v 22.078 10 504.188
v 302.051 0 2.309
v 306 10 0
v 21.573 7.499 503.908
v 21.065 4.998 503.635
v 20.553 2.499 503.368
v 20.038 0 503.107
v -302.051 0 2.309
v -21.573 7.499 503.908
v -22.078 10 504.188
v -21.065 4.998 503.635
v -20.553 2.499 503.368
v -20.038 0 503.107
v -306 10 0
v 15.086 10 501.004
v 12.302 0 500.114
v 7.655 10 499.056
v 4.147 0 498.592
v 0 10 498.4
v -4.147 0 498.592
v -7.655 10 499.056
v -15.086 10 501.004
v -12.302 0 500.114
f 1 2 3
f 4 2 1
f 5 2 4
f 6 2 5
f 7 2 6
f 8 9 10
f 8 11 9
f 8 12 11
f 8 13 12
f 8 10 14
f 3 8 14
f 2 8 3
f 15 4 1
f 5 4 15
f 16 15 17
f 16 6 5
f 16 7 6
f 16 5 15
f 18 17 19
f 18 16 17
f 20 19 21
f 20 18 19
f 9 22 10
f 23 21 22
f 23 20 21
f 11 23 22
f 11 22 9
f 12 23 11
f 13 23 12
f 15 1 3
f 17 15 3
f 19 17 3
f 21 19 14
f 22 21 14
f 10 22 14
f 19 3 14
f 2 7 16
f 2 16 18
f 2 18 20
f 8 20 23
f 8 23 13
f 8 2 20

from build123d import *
from OCP.BRepFilletAPI import BRepFilletAPI_MakeChamfer

# Parameters (mm, degrees)
BOSS_EXTRUDE1_DEPTH = 10
CHAMFER1_SIZE       = 10
CHAMFER1_SIZE_2     = 2.308681911


with BuildPart() as part:
    # Sketch1 → Boss-Extrude1 (new body)
    with BuildSketch(Plane(origin=(0, 0, 0), x_dir=(1, 0, 0), z_dir=(0, 1, 0))):
        with BuildLine():
            Line((-306, 0), (306, 0))
            Line((306, 0), (22.078307516, -504.188415778))
            ThreePointArc((22.078307516, -504.188415778), (0, -498.4), (-22.078307516, -504.188415778))
            Line((-22.078307516, -504.188415778), (-306, 0))
        make_face()
    extrude(amount=BOSS_EXTRUDE1_DEPTH)

    # Chamfer1
    chamfer1_edges_1 = [part.edges().sort_by_distance(p)[0] for p in [
        (-164.039153758, 0, 252.094207889),
    ]]
    chamfer1_side_1 = [part.faces().sort_by_distance(p)[0] for p in [
        (-164.039153758, 0.046173638, 252.094207889),
    ]]
    chamfer1_edges_2 = [part.edges().sort_by_distance(p)[0] for p in [
        (0, 0, 0),
    ]]
    chamfer1_side_2 = [part.faces().sort_by_distance(p)[0] for p in [
        (0, 0.046173638, 0),
    ]]
    chamfer1_edges_3 = [part.edges().sort_by_distance(p)[0] for p in [
        (164.039153758, 0, 252.094207889),
    ]]
    chamfer1_side_3 = [part.faces().sort_by_distance(p)[0] for p in [
        (164.039153758, 0.046173638, 252.094207889),
    ]]
    chamfer1 = BRepFilletAPI_MakeChamfer(part.part.solid().wrapped)
    for e in chamfer1_edges_1:
        chamfer1.Add(CHAMFER1_SIZE - 0.0001, CHAMFER1_SIZE_2 - 0.0001, e.wrapped, chamfer1_side_1[0].wrapped)
    for e in chamfer1_edges_2:
        chamfer1.Add(CHAMFER1_SIZE - 0.0001, CHAMFER1_SIZE_2 - 0.0001, e.wrapped, chamfer1_side_2[0].wrapped)
    for e in chamfer1_edges_3:
        chamfer1.Add(CHAMFER1_SIZE - 0.0001, CHAMFER1_SIZE_2 - 0.0001, e.wrapped, chamfer1_side_3[0].wrapped)
    add(Compound.cast(chamfer1.Shape()), mode=Mode.REPLACE)  # a hair under: the kernel refuses the full size


solid = part.part
